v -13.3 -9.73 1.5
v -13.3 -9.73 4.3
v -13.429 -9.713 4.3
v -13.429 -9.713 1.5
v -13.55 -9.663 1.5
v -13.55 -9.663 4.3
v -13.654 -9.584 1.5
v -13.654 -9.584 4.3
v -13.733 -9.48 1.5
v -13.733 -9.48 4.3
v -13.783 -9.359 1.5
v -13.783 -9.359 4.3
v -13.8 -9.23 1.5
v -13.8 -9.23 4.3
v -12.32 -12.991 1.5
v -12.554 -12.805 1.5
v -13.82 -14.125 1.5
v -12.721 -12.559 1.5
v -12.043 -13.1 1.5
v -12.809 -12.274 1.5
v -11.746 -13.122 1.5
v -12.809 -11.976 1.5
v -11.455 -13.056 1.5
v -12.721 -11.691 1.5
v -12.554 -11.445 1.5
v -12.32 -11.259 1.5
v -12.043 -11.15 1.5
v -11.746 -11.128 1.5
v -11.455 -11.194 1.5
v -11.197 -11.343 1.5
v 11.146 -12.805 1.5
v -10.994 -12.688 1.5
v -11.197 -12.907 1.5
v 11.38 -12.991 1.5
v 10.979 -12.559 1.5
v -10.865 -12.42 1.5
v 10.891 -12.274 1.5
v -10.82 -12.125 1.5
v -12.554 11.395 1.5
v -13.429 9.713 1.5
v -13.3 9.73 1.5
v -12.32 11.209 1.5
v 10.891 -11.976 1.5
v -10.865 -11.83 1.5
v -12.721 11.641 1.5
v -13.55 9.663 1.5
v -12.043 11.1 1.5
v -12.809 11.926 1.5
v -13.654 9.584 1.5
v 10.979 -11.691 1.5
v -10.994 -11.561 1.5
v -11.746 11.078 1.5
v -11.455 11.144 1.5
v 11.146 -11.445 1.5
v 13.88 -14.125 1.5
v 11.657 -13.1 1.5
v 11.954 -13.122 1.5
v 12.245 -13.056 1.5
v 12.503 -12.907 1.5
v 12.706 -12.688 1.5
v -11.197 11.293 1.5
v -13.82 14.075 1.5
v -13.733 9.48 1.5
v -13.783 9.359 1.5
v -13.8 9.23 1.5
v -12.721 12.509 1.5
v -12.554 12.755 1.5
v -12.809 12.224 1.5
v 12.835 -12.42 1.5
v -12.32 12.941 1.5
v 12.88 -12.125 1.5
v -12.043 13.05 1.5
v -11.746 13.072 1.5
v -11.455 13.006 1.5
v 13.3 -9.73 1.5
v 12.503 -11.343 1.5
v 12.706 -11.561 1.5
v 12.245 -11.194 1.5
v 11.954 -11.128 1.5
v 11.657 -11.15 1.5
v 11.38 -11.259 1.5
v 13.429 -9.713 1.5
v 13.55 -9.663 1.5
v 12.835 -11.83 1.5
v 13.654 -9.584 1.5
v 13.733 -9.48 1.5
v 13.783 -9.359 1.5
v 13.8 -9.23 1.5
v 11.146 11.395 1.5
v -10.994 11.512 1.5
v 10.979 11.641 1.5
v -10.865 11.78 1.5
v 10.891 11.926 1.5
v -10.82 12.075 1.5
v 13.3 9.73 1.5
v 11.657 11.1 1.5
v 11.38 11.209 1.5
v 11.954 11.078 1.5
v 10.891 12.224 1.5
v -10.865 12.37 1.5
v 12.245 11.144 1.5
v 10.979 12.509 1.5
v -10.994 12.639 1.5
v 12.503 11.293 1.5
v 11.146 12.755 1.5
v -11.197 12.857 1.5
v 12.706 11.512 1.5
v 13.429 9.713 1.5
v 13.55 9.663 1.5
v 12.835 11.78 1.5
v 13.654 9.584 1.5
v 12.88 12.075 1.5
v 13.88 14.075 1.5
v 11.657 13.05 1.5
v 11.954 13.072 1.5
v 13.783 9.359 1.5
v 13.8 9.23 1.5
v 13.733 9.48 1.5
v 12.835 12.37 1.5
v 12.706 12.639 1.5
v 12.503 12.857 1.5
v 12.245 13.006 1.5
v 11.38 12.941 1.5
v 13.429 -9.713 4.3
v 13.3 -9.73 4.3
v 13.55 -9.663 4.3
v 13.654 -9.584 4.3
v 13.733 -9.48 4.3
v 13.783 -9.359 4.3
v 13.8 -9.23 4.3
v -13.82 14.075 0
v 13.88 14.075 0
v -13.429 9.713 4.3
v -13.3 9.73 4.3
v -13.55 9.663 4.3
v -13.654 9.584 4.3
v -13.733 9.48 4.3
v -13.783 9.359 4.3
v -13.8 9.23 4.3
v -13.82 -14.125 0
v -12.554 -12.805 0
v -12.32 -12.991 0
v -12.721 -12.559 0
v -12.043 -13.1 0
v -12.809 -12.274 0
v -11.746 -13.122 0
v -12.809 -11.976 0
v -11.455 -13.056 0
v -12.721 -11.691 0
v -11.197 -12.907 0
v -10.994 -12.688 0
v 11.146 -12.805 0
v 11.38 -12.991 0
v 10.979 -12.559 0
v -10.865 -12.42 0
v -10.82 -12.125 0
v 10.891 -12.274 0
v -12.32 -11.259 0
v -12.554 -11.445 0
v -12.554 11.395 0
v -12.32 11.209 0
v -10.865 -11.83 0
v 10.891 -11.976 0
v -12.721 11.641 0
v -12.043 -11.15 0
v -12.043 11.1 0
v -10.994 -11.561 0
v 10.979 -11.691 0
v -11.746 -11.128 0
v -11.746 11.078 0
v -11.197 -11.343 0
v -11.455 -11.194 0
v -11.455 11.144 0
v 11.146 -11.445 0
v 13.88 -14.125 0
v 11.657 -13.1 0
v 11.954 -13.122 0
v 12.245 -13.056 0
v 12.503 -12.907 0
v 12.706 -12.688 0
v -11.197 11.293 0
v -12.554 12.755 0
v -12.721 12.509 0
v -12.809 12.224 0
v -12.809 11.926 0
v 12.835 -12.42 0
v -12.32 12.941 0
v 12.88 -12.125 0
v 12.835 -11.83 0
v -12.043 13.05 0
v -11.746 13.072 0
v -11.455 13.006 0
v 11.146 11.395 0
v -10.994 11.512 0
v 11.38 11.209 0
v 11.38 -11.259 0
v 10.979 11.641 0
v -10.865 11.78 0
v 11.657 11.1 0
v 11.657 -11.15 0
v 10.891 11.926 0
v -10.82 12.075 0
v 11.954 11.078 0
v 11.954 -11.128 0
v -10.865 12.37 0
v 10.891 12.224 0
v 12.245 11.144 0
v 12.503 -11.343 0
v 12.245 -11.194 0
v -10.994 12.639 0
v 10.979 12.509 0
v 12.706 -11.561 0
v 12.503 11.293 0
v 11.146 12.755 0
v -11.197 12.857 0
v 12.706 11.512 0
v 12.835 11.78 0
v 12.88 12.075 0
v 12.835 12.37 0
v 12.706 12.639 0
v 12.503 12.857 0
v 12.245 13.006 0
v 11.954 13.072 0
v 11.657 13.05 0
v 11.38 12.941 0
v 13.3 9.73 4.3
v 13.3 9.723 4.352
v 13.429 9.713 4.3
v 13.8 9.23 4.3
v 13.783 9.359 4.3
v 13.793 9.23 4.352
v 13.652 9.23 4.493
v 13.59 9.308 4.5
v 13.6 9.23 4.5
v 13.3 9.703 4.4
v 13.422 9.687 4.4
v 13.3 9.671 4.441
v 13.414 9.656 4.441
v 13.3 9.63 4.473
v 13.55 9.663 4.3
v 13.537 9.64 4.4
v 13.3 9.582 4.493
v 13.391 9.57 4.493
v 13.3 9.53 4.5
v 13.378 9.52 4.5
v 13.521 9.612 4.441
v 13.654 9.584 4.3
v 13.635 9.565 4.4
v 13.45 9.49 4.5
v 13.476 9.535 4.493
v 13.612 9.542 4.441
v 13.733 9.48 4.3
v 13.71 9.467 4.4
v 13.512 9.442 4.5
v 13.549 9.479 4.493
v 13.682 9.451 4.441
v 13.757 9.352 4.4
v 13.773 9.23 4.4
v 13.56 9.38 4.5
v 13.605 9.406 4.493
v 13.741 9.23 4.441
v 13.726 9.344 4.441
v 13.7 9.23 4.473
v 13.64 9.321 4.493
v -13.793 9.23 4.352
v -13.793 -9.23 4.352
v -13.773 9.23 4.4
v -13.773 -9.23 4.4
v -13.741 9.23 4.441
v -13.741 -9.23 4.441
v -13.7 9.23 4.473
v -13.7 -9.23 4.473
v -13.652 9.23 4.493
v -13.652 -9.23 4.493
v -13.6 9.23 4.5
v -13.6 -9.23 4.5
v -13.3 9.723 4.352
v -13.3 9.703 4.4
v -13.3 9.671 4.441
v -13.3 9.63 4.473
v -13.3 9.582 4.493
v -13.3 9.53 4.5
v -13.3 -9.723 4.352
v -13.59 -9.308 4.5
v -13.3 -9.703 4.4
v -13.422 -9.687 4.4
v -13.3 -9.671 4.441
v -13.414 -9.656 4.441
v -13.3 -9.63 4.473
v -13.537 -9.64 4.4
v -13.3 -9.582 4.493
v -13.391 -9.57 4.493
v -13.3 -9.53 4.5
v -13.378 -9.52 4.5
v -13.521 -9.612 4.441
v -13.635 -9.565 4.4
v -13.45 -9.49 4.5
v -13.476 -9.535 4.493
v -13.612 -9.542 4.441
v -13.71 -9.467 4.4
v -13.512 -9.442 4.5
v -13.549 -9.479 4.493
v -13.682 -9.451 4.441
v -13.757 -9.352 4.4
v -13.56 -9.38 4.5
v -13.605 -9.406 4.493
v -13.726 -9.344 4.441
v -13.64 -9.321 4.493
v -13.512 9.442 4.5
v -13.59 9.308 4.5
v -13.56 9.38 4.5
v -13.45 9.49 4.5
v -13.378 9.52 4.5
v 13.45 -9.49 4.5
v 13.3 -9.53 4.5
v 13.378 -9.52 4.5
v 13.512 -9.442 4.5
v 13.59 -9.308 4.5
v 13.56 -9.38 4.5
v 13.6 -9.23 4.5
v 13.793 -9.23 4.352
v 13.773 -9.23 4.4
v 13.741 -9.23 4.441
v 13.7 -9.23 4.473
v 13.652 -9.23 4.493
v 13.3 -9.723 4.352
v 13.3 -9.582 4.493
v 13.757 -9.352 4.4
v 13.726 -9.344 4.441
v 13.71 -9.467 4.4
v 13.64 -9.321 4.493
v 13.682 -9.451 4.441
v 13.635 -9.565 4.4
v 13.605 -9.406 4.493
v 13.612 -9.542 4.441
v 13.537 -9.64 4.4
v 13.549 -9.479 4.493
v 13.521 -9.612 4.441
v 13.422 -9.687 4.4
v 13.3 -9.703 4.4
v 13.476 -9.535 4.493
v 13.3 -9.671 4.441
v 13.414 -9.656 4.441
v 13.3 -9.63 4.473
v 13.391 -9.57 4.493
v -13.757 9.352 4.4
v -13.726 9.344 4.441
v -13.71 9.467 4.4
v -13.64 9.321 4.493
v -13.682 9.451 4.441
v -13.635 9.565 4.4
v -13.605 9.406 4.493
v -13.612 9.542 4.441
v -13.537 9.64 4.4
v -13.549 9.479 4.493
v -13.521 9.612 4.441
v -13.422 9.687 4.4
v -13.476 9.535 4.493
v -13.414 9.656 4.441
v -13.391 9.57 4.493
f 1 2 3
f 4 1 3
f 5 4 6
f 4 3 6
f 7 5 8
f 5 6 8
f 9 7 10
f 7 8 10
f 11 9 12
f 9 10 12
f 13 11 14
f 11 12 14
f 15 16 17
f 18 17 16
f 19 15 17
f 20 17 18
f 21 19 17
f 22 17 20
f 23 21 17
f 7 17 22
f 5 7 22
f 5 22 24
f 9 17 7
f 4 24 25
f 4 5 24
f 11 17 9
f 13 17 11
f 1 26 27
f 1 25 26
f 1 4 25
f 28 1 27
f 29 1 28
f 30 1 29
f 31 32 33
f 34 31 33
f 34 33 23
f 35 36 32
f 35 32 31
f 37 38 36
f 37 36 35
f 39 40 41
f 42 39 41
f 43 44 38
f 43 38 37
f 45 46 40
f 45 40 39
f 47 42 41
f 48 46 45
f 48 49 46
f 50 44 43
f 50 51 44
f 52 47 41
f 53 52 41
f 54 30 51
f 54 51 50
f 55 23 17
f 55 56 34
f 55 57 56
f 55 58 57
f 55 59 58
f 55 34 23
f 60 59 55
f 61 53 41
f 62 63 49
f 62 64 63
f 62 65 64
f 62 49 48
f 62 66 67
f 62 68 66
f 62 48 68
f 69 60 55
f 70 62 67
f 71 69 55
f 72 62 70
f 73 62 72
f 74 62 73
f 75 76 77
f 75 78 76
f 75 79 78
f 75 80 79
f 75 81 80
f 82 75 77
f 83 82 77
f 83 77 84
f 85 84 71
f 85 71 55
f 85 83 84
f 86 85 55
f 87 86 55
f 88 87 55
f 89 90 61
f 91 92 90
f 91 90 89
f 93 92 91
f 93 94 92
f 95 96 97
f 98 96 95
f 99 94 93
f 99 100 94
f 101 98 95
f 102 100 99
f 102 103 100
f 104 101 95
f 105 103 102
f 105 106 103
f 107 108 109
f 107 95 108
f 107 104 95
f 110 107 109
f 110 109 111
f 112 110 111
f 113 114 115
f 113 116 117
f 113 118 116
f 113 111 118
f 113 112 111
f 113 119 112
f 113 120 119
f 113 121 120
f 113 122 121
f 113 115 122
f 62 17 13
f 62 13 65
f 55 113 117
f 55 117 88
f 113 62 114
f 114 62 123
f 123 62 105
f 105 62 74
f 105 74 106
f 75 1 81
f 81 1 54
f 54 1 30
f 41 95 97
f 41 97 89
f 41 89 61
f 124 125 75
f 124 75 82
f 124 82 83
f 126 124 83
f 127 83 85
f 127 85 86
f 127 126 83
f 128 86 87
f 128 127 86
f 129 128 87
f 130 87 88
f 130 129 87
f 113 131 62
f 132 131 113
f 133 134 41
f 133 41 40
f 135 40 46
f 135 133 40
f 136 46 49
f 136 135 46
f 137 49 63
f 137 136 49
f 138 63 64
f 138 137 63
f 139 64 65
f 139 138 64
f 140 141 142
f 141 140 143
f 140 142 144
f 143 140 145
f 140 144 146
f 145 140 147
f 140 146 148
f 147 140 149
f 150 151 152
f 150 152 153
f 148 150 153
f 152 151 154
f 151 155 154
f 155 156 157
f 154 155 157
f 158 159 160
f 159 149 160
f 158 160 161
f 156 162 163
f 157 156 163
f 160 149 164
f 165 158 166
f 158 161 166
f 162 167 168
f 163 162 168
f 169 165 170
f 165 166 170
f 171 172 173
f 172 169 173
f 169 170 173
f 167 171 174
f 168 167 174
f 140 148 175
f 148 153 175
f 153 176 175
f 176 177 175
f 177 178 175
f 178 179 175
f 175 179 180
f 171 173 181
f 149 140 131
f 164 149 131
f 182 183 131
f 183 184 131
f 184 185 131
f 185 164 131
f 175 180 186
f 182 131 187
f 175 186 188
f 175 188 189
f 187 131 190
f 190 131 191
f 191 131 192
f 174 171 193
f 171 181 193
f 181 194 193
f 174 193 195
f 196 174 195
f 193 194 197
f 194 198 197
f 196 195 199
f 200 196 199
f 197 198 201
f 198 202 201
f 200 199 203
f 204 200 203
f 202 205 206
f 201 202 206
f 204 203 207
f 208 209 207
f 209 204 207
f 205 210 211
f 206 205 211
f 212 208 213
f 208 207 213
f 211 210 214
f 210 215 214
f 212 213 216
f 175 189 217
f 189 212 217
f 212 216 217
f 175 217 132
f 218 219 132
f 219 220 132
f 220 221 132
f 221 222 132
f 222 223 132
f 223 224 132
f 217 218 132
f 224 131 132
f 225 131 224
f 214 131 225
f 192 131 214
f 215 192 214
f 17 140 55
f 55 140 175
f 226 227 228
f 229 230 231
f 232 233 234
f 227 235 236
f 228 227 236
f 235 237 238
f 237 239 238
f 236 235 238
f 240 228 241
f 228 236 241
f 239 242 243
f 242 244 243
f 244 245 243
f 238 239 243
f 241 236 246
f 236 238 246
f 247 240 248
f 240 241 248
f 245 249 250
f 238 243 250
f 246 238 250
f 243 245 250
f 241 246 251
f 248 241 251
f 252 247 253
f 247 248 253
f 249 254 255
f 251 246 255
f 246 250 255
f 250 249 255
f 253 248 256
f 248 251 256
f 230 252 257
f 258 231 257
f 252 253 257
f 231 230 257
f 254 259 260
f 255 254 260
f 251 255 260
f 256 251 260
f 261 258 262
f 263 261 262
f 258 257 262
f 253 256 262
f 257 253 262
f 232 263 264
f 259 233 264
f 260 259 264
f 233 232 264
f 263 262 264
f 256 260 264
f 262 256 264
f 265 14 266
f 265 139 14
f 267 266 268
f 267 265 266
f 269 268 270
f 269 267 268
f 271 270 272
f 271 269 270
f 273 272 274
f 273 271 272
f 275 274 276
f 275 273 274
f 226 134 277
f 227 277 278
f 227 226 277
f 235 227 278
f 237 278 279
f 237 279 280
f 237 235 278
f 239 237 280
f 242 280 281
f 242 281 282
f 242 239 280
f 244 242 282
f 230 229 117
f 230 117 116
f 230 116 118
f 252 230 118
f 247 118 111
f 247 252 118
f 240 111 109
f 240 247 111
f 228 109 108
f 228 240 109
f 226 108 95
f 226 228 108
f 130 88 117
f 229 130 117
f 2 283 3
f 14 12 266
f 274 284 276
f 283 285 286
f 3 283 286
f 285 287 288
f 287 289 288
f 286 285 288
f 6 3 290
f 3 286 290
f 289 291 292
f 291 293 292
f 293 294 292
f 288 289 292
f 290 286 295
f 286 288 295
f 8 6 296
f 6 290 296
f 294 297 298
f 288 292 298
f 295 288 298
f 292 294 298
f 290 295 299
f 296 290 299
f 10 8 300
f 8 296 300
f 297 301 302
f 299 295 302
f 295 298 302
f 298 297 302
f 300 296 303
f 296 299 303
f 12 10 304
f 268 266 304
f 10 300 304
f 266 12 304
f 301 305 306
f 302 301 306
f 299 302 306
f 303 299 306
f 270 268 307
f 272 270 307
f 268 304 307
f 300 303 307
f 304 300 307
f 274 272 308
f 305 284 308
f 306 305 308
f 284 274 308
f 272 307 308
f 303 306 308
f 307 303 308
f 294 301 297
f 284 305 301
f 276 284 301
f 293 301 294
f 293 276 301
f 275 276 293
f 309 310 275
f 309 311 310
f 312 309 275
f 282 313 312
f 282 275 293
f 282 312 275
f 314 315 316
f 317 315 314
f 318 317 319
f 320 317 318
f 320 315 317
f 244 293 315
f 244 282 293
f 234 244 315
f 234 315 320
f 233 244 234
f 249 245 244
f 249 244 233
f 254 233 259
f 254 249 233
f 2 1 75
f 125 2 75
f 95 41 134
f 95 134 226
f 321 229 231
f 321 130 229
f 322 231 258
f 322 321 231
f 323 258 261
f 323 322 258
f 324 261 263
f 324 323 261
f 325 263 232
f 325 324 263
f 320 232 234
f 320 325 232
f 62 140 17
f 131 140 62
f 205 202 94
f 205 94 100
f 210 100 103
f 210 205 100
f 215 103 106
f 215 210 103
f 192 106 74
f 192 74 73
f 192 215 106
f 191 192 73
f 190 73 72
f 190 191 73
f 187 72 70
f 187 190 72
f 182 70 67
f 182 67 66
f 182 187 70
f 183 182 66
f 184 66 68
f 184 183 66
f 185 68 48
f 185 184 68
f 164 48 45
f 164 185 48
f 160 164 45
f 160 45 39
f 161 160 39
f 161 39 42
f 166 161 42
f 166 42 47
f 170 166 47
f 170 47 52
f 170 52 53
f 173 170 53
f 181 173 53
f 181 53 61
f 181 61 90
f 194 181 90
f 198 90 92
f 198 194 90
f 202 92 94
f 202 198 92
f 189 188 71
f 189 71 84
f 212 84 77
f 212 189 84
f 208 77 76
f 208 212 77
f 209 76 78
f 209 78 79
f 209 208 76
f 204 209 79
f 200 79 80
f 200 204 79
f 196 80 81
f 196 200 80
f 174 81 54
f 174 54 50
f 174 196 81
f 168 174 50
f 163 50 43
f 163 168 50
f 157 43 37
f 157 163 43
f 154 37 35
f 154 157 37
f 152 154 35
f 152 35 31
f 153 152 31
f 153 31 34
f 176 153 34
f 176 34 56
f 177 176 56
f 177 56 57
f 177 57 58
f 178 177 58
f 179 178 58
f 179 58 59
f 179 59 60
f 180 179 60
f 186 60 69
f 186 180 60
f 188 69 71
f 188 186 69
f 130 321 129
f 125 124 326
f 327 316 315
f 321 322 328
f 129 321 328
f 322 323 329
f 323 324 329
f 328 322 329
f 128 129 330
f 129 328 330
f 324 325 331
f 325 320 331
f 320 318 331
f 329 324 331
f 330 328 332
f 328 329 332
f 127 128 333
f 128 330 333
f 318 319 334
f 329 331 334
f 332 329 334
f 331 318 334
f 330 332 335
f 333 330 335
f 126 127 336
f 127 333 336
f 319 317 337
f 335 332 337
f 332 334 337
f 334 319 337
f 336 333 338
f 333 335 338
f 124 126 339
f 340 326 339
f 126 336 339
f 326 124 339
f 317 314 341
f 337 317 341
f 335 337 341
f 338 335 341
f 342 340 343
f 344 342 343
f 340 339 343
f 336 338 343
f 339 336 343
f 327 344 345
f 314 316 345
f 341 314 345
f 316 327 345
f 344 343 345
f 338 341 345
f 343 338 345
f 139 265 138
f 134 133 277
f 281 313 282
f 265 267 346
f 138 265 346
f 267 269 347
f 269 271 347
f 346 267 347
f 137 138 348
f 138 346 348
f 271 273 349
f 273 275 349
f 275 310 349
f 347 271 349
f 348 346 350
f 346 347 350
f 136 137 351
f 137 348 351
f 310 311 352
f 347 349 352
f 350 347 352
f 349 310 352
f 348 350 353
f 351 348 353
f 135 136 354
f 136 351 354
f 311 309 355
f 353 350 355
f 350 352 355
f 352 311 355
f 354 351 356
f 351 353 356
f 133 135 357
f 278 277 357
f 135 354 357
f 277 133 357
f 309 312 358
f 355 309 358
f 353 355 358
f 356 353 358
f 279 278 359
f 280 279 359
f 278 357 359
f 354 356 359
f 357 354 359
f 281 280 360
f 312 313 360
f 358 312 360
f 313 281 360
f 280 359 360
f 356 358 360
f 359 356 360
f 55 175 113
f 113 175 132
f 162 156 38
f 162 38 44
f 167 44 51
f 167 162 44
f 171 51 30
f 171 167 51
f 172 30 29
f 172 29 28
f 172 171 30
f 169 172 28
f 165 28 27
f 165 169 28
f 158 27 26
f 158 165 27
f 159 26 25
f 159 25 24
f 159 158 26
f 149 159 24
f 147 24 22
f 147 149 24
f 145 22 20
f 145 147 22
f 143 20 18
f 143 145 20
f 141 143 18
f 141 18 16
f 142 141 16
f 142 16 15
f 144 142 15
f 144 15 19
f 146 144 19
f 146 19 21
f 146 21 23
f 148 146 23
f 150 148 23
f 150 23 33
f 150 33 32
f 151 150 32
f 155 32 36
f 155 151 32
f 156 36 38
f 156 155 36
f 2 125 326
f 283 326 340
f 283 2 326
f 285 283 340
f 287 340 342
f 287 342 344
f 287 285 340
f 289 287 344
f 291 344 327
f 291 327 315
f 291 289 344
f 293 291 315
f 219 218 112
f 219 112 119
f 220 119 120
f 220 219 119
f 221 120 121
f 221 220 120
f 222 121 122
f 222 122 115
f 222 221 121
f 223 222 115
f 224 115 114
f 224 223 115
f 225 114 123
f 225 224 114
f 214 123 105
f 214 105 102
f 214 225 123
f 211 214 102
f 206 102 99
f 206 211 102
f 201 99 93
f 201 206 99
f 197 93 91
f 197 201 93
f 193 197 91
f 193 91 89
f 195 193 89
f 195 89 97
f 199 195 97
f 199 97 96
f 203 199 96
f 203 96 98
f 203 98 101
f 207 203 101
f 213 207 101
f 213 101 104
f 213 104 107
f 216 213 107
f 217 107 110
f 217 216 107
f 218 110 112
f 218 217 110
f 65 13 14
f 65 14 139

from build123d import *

# Parameters (mm, degrees)
F0_W     = 27.7
F0_H     = 28.2
F0_R     = 1
F2_DEPTH = 1.5
F3_W     = 27.6
F3_H     = 19.46
F4_DEPTH = 3
F5_R     = 0.5
F6_R     = 0.2


with BuildPart() as f2:
    # F0 (on Top) → F2 (new body)
    with BuildSketch(Plane.XY):
        with Locations((0.0295223769, -0.0248048455)):
            Rectangle(F0_W, F0_H)
        with Locations((-11.8204776231, -12.1248048455)):
            Circle(F0_R, mode=Mode.SUBTRACT)
        with Locations((11.8795223769, -12.1248048455)):
            Circle(F0_R, mode=Mode.SUBTRACT)
        with Locations((-11.8204776231, 12.0751951545)):
            Circle(F0_R, mode=Mode.SUBTRACT)
        with Locations((11.8795223769, 12.0751951545)):
            Circle(F0_R, mode=Mode.SUBTRACT)
    extrude(amount=F2_DEPTH)

    # F3 (on face) → F4 (join)
    with BuildSketch(Plane.XY.offset(1.5)):
        Rectangle(F3_W, F3_H)
    extrude(amount=F4_DEPTH)

    # F5
    f5_edges = [f2.edges().sort_by_distance(p)[0] for p in [
        (13.8, -9.73, 3),
        (13.8, 9.73, 3),
        (-13.8, 9.73, 3),
        (-13.8, -9.73, 3),
    ]]
    fillet(f5_edges, radius=F5_R)

    # F6
    f6_edges = [f2.edges().sort_by_distance(p)[0] for p in [
        (0, 9.73, 4.5),
        (13.653553, 9.583553, 4.5),
        (-13.653553, 9.583553, 4.5),
        (13.8, 0, 4.5),
        (-13.8, 0, 4.5),
        (13.653553, -9.583553, 4.5),
        (-13.653553, -9.583553, 4.5),
        (0, -9.73, 4.5),
    ]]
    fillet(f6_edges, radius=F6_R)


solid = f2.part
